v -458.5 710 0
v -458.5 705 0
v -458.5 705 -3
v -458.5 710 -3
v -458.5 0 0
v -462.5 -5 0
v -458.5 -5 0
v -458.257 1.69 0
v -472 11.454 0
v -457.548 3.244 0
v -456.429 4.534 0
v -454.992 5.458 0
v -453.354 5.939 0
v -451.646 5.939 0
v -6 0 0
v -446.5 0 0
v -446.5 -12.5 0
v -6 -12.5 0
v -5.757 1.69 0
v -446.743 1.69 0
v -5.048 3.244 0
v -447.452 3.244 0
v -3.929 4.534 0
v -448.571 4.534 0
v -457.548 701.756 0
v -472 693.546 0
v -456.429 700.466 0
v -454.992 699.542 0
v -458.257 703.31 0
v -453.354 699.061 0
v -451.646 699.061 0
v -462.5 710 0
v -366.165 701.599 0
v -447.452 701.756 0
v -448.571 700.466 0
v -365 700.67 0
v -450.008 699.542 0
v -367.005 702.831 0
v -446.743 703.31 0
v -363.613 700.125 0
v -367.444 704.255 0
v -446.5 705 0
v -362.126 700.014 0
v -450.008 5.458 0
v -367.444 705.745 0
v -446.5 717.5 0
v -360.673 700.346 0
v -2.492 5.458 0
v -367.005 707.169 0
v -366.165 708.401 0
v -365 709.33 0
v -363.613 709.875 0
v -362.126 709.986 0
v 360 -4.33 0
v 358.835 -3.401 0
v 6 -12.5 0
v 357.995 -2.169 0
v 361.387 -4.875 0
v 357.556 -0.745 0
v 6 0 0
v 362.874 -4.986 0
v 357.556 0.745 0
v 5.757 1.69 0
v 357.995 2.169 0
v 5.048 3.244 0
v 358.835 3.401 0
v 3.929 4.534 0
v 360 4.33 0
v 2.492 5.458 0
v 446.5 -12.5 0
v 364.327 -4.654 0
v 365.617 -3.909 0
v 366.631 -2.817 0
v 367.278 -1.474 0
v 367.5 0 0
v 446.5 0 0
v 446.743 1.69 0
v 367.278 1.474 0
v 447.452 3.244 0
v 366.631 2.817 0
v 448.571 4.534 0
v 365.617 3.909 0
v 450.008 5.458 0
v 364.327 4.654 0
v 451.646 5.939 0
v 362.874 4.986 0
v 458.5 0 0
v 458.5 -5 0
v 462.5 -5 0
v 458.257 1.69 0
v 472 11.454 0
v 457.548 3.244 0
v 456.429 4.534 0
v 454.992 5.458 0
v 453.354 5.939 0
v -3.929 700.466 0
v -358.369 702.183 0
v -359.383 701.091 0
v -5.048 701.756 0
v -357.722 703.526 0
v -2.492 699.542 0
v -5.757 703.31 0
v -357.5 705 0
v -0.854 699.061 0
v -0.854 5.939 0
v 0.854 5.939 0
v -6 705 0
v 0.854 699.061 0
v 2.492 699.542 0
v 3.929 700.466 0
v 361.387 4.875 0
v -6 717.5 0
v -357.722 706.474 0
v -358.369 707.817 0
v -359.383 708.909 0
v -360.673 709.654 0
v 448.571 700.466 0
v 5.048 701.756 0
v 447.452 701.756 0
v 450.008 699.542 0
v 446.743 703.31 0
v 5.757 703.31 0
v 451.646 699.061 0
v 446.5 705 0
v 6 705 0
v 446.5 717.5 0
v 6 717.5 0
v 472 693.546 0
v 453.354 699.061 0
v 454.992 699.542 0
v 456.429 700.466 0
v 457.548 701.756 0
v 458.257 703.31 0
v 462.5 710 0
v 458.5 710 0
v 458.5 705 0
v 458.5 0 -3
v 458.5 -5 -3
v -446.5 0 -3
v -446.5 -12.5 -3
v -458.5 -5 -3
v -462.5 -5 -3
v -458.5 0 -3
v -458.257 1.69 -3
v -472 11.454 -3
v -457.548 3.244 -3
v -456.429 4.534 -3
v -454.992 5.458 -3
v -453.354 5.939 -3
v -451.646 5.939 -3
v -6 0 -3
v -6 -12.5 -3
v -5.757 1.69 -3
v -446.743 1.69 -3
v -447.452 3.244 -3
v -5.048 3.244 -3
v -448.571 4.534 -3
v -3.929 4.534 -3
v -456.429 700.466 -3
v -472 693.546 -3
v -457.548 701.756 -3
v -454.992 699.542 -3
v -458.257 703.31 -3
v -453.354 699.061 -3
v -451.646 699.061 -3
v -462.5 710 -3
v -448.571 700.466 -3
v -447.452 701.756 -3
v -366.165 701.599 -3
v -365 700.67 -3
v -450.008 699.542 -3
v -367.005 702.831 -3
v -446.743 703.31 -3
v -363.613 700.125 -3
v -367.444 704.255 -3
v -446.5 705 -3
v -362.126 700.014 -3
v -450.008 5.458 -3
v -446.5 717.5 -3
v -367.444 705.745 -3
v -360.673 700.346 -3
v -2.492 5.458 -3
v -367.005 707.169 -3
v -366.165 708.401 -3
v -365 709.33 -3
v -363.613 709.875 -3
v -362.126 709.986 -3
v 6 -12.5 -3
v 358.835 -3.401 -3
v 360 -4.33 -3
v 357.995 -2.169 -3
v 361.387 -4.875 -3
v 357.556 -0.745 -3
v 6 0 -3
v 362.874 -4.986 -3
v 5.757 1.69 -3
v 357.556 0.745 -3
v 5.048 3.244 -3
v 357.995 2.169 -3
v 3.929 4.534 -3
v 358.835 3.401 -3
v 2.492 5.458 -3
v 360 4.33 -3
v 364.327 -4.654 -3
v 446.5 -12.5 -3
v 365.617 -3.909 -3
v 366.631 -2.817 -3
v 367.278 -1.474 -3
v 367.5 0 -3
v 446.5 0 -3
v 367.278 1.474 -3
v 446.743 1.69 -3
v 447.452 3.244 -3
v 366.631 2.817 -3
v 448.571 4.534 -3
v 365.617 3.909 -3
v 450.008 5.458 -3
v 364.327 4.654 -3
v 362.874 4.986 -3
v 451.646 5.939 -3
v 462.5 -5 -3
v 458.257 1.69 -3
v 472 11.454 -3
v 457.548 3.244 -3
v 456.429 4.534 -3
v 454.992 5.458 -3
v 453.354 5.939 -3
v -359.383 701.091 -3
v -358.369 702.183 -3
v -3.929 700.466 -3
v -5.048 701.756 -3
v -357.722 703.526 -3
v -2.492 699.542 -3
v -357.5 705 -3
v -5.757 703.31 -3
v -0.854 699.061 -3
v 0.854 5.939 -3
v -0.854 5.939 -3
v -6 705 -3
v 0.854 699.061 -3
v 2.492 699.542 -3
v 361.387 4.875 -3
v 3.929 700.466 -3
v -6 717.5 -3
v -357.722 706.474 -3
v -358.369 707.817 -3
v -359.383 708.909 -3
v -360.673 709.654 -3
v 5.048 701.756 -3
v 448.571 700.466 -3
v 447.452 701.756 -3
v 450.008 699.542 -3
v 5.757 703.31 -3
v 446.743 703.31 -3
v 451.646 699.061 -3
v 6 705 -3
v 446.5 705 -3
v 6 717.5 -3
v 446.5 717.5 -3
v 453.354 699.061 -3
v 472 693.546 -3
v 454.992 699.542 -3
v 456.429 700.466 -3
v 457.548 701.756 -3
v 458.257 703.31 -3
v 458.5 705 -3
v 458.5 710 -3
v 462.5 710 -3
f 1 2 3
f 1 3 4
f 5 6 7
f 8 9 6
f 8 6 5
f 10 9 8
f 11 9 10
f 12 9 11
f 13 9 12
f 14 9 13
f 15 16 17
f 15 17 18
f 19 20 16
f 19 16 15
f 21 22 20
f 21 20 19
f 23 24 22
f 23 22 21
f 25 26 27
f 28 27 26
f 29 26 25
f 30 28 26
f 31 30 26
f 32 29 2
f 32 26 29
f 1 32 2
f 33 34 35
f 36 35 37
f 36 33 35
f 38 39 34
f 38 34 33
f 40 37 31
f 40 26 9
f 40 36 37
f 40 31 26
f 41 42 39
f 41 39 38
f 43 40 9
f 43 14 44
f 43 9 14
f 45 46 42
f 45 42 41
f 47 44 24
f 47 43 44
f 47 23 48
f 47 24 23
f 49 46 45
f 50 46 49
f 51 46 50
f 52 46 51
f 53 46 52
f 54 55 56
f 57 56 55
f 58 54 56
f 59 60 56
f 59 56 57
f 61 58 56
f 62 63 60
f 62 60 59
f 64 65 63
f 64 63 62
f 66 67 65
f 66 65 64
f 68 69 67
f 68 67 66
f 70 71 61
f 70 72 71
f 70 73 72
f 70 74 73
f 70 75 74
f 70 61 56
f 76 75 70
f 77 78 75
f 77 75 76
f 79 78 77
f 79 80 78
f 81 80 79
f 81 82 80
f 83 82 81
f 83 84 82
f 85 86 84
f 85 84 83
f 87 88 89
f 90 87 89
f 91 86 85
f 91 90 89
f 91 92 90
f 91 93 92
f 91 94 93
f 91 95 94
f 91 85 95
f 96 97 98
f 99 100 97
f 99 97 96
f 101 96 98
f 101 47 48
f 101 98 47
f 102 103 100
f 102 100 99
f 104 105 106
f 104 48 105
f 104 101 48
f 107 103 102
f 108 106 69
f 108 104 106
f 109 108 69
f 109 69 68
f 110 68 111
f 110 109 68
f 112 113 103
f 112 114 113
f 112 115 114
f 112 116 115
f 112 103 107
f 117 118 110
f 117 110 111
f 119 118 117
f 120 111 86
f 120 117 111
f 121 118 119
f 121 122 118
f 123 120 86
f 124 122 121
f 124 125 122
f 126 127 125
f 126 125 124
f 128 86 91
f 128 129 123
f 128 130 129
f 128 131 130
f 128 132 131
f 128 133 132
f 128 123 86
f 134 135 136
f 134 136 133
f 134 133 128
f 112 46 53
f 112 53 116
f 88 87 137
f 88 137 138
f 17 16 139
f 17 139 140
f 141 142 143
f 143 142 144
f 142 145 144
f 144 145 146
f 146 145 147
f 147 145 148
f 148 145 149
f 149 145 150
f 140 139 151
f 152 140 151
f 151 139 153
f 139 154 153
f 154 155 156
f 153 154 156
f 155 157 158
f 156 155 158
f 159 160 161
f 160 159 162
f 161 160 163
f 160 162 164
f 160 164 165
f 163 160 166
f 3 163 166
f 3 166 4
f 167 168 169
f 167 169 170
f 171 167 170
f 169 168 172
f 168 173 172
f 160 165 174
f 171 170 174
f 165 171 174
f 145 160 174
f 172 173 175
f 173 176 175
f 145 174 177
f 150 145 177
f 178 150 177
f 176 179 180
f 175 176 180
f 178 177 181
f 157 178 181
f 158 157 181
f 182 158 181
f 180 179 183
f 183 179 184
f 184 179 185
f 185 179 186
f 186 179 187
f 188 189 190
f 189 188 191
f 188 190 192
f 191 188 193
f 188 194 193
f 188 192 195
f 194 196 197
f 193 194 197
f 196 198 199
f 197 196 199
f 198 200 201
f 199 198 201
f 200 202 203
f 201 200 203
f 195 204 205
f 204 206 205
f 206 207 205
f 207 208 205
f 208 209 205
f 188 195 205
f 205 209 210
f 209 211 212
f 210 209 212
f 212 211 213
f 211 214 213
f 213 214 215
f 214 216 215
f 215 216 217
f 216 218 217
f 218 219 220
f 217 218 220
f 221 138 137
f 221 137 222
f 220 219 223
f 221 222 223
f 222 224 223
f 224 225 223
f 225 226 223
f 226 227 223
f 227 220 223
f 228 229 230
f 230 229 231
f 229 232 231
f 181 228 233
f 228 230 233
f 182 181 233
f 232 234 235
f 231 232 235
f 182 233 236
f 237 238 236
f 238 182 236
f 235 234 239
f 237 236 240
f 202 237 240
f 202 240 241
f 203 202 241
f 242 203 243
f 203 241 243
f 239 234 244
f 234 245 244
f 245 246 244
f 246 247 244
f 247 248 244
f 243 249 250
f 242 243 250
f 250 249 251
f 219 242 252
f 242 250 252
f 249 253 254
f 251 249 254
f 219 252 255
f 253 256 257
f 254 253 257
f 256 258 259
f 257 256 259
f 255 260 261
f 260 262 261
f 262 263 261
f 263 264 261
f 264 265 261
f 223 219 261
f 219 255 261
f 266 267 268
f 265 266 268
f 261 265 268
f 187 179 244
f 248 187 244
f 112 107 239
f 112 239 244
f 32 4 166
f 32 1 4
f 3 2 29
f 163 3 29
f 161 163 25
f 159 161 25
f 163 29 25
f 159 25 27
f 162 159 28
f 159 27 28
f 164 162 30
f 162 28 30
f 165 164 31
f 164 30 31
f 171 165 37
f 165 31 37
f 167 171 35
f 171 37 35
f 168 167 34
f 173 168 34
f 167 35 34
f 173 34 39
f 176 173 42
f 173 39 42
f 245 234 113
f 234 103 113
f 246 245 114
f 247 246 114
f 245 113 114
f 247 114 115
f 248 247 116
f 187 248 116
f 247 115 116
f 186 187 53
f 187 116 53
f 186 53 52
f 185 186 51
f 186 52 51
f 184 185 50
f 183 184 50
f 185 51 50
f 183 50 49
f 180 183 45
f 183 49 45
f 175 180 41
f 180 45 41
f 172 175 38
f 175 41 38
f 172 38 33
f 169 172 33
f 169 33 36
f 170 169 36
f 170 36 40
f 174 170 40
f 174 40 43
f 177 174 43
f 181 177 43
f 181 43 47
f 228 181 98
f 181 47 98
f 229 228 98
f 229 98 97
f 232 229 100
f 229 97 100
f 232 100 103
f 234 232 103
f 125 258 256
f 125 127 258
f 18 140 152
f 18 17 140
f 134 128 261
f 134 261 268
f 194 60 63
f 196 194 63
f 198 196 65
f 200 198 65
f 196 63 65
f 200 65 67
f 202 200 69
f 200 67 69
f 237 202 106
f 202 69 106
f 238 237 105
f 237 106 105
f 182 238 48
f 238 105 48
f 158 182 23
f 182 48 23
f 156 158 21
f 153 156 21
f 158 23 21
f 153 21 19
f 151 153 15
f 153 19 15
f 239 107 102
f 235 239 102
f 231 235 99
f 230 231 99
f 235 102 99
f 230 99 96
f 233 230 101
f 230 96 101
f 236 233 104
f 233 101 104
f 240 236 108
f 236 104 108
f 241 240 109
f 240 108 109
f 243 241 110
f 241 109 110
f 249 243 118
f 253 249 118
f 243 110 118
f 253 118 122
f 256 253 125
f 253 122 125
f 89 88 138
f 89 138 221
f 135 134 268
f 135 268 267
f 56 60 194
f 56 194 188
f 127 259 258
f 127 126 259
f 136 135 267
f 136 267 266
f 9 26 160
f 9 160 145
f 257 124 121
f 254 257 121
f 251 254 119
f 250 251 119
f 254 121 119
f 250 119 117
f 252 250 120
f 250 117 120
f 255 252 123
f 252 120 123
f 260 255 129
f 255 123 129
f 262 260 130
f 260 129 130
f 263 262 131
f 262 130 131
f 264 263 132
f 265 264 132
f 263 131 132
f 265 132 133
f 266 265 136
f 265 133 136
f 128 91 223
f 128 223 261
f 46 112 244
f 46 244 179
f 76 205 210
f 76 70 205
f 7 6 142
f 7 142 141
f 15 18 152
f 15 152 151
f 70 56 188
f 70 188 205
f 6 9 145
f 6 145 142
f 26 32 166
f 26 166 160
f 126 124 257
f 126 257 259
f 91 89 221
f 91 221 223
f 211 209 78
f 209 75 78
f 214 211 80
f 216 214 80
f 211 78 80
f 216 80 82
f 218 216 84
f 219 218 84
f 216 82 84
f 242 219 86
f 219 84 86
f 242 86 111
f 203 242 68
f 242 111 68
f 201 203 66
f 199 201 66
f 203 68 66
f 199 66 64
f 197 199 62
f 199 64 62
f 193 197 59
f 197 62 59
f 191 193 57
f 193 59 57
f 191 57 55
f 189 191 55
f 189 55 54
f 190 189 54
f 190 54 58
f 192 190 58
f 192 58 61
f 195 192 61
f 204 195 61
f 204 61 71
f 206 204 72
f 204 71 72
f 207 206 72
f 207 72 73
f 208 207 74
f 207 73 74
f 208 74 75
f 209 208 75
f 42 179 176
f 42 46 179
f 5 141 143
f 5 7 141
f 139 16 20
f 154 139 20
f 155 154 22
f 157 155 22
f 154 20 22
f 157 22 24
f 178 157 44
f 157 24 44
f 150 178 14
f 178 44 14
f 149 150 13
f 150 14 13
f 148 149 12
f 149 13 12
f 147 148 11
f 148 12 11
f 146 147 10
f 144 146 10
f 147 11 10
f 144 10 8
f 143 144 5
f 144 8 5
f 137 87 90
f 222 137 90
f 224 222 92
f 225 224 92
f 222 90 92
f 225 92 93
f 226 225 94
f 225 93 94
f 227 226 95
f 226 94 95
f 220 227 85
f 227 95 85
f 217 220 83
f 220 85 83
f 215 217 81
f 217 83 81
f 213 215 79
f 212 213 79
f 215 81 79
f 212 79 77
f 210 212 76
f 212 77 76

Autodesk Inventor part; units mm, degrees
sketch "Skizze_3" plane through (0, 0, 0) normal (0, 0, 1) x (1, 0, 0)
  line L0 (-472, 11.4545) -> (-462.5, -5)
  line L1 (-462.5, -5) -> (-458.5, -5)
  line L2 (-458.5, -5) -> (-458.5, 0)
  arc A0 (-446.5, 0) -> (-458.5, 0) centre (-452.5, 0) ccw
  line L3 (-446.5, 0) -> (-446.5, -12.5)
  line L4 (-446.5, -12.5) -> (-6, -12.5)
  line L5 (-6, -12.5) -> (-6, 0)
  arc A1 (6, 0) -> (-6, 0) centre (0, 0) ccw
  line L6 (6, 0) -> (6, -12.5)
  line L7 (6, -12.5) -> (446.5, -12.5)
  line L8 (446.5, -12.5) -> (446.5, 0)
  arc A2 (458.5, 0) -> (446.5, 0) centre (452.5, 0) ccw
  line L9 (458.5, 0) -> (458.5, -5)
  line L10 (458.5, -5) -> (462.5, -5)
  line L11 (462.5, -5) -> (472, 11.4545)
  line L12 (472, 11.4545) -> (472, 693.5455)
  line L13 (472, 693.5455) -> (462.5, 710)
  line L14 (462.5, 710) -> (458.5, 710)
  line L15 (458.5, 710) -> (458.5, 705)
  arc A3 (446.5, 705) -> (458.5, 705) centre (452.5, 705) ccw
  line L16 (446.5, 705) -> (446.5, 717.5)
  line L17 (446.5, 717.5) -> (6, 717.5)
  line L18 (6, 717.5) -> (6, 705)
  arc A4 (-6, 705) -> (6, 705) centre (0, 705) ccw
  line L19 (-6, 705) -> (-6, 717.5)
  line L20 (-6, 717.5) -> (-446.5, 717.5)
  line L21 (-446.5, 717.5) -> (-446.5, 705)
  arc A5 (-458.5, 705) -> (-446.5, 705) centre (-452.5, 705) ccw
  line L22 (-458.5, 705) -> (-458.5, 710)
  line L23 (-458.5, 710) -> (-462.5, 710)
  line L24 (-462.5, 710) -> (-472, 693.5455)
  line L25 (-472, 693.5455) -> (-472, 11.4545)
  circle A6 centre (362.5, 0) radius 5
  circle A7 centre (-362.5, 705) radius 5
extrude "Extrusion1" add sketch "Skizze_3" against normal blind 3
ref_plane "DPF11_XY" through (472, 352.5, 0) normal (0, 0, 1) x (1, 0, 0)
ref_plane "DPF11_YZ" through (472, 352.5, 0) normal (1, 0, 0) x (0, 1, 0)
ref_plane "DPF11_ZX" through (472, 352.5, 0) normal (0, 1, 0) x (0, 0, 1)
ref_plane "DPF12_XY" through (-472, 352.5, 0) normal (0, 0, 1) x (1, 0, 0)
ref_plane "DPF12_YZ" through (-472, 352.5, 0) normal (1, 0, 0) x (0, 1, 0)
ref_plane "DPF12_ZX" through (-472, 352.5, 0) normal (0, 1, 0) x (0, 0, 1)
ref_plane "DPF21_XY" through (452.5, 705, 0) normal (0, 0, 1) x (1, 0, 0)
ref_plane "DPF21_YZ" through (452.5, 705, 0) normal (1, 0, 0) x (0, 1, 0)
ref_plane "DPF21_ZX" through (452.5, 705, 0) normal (0, 1, 0) x (0, 0, 1)
ref_plane "DPF22_XY" through (-452.5, 705, 0) normal (0, 0, 1) x (1, 0, 0)
ref_plane "DPF22_YZ" through (-452.5, 705, 0) normal (1, 0, 0) x (0, 1, 0)
ref_plane "DPF22_ZX" through (-452.5, 705, 0) normal (0, 1, 0) x (0, 0, 1)
ref_plane "DPG11_XY" through (0, -12.5, 0) normal (0, 0, 1) x (1, 0, 0)
ref_plane "DPG11_YZ" through (0, -12.5, 0) normal (1, 0, 0) x (0, 1, 0)
ref_plane "DPG11_ZX" through (0, -12.5, 0) normal (0, 1, 0) x (0, 0, 1)
ref_plane "DPG12_XY" through (0, 717.5, 0) normal (0, 0, 1) x (1, 0, 0)
ref_plane "DPG12_YZ" through (0, 717.5, 0) normal (1, 0, 0) x (0, 1, 0)
ref_plane "DPG12_ZX" through (0, 717.5, 0) normal (0, 1, 0) x (0, 0, 1)
ref_plane "DPG21_XY" through (452.5, 0, 0) normal (0, 0, 1) x (1, 0, 0)
ref_plane "DPG21_YZ" through (452.5, 0, 0) normal (1, 0, 0) x (0, 1, 0)
ref_plane "DPG21_ZX" through (452.5, 0, 0) normal (0, 1, 0) x (0, 0, 1)
ref_plane "DPG22_XY" through (452.5, 705, 0) normal (0, 0, 1) x (1, 0, 0)
ref_plane "DPG22_YZ" through (452.5, 705, 0) normal (1, 0, 0) x (0, 1, 0)
ref_plane "DPG22_ZX" through (452.5, 705, 0) normal (0, 1, 0) x (0, 0, 1)
ref_plane "montageplatte_XY" through (-452.5, 0, 0) normal (0, 0, 1) x (1, 0, 0)
ref_plane "montageplatte_YZ" through (-452.5, 0, 0) normal (1, 0, 0) x (0, 1, 0)
ref_plane "montageplatte_ZX" through (-452.5, 0, 0) normal (0, 1, 0) x (0, 0, 1)
properties part number "1100_02_16 (2)"
